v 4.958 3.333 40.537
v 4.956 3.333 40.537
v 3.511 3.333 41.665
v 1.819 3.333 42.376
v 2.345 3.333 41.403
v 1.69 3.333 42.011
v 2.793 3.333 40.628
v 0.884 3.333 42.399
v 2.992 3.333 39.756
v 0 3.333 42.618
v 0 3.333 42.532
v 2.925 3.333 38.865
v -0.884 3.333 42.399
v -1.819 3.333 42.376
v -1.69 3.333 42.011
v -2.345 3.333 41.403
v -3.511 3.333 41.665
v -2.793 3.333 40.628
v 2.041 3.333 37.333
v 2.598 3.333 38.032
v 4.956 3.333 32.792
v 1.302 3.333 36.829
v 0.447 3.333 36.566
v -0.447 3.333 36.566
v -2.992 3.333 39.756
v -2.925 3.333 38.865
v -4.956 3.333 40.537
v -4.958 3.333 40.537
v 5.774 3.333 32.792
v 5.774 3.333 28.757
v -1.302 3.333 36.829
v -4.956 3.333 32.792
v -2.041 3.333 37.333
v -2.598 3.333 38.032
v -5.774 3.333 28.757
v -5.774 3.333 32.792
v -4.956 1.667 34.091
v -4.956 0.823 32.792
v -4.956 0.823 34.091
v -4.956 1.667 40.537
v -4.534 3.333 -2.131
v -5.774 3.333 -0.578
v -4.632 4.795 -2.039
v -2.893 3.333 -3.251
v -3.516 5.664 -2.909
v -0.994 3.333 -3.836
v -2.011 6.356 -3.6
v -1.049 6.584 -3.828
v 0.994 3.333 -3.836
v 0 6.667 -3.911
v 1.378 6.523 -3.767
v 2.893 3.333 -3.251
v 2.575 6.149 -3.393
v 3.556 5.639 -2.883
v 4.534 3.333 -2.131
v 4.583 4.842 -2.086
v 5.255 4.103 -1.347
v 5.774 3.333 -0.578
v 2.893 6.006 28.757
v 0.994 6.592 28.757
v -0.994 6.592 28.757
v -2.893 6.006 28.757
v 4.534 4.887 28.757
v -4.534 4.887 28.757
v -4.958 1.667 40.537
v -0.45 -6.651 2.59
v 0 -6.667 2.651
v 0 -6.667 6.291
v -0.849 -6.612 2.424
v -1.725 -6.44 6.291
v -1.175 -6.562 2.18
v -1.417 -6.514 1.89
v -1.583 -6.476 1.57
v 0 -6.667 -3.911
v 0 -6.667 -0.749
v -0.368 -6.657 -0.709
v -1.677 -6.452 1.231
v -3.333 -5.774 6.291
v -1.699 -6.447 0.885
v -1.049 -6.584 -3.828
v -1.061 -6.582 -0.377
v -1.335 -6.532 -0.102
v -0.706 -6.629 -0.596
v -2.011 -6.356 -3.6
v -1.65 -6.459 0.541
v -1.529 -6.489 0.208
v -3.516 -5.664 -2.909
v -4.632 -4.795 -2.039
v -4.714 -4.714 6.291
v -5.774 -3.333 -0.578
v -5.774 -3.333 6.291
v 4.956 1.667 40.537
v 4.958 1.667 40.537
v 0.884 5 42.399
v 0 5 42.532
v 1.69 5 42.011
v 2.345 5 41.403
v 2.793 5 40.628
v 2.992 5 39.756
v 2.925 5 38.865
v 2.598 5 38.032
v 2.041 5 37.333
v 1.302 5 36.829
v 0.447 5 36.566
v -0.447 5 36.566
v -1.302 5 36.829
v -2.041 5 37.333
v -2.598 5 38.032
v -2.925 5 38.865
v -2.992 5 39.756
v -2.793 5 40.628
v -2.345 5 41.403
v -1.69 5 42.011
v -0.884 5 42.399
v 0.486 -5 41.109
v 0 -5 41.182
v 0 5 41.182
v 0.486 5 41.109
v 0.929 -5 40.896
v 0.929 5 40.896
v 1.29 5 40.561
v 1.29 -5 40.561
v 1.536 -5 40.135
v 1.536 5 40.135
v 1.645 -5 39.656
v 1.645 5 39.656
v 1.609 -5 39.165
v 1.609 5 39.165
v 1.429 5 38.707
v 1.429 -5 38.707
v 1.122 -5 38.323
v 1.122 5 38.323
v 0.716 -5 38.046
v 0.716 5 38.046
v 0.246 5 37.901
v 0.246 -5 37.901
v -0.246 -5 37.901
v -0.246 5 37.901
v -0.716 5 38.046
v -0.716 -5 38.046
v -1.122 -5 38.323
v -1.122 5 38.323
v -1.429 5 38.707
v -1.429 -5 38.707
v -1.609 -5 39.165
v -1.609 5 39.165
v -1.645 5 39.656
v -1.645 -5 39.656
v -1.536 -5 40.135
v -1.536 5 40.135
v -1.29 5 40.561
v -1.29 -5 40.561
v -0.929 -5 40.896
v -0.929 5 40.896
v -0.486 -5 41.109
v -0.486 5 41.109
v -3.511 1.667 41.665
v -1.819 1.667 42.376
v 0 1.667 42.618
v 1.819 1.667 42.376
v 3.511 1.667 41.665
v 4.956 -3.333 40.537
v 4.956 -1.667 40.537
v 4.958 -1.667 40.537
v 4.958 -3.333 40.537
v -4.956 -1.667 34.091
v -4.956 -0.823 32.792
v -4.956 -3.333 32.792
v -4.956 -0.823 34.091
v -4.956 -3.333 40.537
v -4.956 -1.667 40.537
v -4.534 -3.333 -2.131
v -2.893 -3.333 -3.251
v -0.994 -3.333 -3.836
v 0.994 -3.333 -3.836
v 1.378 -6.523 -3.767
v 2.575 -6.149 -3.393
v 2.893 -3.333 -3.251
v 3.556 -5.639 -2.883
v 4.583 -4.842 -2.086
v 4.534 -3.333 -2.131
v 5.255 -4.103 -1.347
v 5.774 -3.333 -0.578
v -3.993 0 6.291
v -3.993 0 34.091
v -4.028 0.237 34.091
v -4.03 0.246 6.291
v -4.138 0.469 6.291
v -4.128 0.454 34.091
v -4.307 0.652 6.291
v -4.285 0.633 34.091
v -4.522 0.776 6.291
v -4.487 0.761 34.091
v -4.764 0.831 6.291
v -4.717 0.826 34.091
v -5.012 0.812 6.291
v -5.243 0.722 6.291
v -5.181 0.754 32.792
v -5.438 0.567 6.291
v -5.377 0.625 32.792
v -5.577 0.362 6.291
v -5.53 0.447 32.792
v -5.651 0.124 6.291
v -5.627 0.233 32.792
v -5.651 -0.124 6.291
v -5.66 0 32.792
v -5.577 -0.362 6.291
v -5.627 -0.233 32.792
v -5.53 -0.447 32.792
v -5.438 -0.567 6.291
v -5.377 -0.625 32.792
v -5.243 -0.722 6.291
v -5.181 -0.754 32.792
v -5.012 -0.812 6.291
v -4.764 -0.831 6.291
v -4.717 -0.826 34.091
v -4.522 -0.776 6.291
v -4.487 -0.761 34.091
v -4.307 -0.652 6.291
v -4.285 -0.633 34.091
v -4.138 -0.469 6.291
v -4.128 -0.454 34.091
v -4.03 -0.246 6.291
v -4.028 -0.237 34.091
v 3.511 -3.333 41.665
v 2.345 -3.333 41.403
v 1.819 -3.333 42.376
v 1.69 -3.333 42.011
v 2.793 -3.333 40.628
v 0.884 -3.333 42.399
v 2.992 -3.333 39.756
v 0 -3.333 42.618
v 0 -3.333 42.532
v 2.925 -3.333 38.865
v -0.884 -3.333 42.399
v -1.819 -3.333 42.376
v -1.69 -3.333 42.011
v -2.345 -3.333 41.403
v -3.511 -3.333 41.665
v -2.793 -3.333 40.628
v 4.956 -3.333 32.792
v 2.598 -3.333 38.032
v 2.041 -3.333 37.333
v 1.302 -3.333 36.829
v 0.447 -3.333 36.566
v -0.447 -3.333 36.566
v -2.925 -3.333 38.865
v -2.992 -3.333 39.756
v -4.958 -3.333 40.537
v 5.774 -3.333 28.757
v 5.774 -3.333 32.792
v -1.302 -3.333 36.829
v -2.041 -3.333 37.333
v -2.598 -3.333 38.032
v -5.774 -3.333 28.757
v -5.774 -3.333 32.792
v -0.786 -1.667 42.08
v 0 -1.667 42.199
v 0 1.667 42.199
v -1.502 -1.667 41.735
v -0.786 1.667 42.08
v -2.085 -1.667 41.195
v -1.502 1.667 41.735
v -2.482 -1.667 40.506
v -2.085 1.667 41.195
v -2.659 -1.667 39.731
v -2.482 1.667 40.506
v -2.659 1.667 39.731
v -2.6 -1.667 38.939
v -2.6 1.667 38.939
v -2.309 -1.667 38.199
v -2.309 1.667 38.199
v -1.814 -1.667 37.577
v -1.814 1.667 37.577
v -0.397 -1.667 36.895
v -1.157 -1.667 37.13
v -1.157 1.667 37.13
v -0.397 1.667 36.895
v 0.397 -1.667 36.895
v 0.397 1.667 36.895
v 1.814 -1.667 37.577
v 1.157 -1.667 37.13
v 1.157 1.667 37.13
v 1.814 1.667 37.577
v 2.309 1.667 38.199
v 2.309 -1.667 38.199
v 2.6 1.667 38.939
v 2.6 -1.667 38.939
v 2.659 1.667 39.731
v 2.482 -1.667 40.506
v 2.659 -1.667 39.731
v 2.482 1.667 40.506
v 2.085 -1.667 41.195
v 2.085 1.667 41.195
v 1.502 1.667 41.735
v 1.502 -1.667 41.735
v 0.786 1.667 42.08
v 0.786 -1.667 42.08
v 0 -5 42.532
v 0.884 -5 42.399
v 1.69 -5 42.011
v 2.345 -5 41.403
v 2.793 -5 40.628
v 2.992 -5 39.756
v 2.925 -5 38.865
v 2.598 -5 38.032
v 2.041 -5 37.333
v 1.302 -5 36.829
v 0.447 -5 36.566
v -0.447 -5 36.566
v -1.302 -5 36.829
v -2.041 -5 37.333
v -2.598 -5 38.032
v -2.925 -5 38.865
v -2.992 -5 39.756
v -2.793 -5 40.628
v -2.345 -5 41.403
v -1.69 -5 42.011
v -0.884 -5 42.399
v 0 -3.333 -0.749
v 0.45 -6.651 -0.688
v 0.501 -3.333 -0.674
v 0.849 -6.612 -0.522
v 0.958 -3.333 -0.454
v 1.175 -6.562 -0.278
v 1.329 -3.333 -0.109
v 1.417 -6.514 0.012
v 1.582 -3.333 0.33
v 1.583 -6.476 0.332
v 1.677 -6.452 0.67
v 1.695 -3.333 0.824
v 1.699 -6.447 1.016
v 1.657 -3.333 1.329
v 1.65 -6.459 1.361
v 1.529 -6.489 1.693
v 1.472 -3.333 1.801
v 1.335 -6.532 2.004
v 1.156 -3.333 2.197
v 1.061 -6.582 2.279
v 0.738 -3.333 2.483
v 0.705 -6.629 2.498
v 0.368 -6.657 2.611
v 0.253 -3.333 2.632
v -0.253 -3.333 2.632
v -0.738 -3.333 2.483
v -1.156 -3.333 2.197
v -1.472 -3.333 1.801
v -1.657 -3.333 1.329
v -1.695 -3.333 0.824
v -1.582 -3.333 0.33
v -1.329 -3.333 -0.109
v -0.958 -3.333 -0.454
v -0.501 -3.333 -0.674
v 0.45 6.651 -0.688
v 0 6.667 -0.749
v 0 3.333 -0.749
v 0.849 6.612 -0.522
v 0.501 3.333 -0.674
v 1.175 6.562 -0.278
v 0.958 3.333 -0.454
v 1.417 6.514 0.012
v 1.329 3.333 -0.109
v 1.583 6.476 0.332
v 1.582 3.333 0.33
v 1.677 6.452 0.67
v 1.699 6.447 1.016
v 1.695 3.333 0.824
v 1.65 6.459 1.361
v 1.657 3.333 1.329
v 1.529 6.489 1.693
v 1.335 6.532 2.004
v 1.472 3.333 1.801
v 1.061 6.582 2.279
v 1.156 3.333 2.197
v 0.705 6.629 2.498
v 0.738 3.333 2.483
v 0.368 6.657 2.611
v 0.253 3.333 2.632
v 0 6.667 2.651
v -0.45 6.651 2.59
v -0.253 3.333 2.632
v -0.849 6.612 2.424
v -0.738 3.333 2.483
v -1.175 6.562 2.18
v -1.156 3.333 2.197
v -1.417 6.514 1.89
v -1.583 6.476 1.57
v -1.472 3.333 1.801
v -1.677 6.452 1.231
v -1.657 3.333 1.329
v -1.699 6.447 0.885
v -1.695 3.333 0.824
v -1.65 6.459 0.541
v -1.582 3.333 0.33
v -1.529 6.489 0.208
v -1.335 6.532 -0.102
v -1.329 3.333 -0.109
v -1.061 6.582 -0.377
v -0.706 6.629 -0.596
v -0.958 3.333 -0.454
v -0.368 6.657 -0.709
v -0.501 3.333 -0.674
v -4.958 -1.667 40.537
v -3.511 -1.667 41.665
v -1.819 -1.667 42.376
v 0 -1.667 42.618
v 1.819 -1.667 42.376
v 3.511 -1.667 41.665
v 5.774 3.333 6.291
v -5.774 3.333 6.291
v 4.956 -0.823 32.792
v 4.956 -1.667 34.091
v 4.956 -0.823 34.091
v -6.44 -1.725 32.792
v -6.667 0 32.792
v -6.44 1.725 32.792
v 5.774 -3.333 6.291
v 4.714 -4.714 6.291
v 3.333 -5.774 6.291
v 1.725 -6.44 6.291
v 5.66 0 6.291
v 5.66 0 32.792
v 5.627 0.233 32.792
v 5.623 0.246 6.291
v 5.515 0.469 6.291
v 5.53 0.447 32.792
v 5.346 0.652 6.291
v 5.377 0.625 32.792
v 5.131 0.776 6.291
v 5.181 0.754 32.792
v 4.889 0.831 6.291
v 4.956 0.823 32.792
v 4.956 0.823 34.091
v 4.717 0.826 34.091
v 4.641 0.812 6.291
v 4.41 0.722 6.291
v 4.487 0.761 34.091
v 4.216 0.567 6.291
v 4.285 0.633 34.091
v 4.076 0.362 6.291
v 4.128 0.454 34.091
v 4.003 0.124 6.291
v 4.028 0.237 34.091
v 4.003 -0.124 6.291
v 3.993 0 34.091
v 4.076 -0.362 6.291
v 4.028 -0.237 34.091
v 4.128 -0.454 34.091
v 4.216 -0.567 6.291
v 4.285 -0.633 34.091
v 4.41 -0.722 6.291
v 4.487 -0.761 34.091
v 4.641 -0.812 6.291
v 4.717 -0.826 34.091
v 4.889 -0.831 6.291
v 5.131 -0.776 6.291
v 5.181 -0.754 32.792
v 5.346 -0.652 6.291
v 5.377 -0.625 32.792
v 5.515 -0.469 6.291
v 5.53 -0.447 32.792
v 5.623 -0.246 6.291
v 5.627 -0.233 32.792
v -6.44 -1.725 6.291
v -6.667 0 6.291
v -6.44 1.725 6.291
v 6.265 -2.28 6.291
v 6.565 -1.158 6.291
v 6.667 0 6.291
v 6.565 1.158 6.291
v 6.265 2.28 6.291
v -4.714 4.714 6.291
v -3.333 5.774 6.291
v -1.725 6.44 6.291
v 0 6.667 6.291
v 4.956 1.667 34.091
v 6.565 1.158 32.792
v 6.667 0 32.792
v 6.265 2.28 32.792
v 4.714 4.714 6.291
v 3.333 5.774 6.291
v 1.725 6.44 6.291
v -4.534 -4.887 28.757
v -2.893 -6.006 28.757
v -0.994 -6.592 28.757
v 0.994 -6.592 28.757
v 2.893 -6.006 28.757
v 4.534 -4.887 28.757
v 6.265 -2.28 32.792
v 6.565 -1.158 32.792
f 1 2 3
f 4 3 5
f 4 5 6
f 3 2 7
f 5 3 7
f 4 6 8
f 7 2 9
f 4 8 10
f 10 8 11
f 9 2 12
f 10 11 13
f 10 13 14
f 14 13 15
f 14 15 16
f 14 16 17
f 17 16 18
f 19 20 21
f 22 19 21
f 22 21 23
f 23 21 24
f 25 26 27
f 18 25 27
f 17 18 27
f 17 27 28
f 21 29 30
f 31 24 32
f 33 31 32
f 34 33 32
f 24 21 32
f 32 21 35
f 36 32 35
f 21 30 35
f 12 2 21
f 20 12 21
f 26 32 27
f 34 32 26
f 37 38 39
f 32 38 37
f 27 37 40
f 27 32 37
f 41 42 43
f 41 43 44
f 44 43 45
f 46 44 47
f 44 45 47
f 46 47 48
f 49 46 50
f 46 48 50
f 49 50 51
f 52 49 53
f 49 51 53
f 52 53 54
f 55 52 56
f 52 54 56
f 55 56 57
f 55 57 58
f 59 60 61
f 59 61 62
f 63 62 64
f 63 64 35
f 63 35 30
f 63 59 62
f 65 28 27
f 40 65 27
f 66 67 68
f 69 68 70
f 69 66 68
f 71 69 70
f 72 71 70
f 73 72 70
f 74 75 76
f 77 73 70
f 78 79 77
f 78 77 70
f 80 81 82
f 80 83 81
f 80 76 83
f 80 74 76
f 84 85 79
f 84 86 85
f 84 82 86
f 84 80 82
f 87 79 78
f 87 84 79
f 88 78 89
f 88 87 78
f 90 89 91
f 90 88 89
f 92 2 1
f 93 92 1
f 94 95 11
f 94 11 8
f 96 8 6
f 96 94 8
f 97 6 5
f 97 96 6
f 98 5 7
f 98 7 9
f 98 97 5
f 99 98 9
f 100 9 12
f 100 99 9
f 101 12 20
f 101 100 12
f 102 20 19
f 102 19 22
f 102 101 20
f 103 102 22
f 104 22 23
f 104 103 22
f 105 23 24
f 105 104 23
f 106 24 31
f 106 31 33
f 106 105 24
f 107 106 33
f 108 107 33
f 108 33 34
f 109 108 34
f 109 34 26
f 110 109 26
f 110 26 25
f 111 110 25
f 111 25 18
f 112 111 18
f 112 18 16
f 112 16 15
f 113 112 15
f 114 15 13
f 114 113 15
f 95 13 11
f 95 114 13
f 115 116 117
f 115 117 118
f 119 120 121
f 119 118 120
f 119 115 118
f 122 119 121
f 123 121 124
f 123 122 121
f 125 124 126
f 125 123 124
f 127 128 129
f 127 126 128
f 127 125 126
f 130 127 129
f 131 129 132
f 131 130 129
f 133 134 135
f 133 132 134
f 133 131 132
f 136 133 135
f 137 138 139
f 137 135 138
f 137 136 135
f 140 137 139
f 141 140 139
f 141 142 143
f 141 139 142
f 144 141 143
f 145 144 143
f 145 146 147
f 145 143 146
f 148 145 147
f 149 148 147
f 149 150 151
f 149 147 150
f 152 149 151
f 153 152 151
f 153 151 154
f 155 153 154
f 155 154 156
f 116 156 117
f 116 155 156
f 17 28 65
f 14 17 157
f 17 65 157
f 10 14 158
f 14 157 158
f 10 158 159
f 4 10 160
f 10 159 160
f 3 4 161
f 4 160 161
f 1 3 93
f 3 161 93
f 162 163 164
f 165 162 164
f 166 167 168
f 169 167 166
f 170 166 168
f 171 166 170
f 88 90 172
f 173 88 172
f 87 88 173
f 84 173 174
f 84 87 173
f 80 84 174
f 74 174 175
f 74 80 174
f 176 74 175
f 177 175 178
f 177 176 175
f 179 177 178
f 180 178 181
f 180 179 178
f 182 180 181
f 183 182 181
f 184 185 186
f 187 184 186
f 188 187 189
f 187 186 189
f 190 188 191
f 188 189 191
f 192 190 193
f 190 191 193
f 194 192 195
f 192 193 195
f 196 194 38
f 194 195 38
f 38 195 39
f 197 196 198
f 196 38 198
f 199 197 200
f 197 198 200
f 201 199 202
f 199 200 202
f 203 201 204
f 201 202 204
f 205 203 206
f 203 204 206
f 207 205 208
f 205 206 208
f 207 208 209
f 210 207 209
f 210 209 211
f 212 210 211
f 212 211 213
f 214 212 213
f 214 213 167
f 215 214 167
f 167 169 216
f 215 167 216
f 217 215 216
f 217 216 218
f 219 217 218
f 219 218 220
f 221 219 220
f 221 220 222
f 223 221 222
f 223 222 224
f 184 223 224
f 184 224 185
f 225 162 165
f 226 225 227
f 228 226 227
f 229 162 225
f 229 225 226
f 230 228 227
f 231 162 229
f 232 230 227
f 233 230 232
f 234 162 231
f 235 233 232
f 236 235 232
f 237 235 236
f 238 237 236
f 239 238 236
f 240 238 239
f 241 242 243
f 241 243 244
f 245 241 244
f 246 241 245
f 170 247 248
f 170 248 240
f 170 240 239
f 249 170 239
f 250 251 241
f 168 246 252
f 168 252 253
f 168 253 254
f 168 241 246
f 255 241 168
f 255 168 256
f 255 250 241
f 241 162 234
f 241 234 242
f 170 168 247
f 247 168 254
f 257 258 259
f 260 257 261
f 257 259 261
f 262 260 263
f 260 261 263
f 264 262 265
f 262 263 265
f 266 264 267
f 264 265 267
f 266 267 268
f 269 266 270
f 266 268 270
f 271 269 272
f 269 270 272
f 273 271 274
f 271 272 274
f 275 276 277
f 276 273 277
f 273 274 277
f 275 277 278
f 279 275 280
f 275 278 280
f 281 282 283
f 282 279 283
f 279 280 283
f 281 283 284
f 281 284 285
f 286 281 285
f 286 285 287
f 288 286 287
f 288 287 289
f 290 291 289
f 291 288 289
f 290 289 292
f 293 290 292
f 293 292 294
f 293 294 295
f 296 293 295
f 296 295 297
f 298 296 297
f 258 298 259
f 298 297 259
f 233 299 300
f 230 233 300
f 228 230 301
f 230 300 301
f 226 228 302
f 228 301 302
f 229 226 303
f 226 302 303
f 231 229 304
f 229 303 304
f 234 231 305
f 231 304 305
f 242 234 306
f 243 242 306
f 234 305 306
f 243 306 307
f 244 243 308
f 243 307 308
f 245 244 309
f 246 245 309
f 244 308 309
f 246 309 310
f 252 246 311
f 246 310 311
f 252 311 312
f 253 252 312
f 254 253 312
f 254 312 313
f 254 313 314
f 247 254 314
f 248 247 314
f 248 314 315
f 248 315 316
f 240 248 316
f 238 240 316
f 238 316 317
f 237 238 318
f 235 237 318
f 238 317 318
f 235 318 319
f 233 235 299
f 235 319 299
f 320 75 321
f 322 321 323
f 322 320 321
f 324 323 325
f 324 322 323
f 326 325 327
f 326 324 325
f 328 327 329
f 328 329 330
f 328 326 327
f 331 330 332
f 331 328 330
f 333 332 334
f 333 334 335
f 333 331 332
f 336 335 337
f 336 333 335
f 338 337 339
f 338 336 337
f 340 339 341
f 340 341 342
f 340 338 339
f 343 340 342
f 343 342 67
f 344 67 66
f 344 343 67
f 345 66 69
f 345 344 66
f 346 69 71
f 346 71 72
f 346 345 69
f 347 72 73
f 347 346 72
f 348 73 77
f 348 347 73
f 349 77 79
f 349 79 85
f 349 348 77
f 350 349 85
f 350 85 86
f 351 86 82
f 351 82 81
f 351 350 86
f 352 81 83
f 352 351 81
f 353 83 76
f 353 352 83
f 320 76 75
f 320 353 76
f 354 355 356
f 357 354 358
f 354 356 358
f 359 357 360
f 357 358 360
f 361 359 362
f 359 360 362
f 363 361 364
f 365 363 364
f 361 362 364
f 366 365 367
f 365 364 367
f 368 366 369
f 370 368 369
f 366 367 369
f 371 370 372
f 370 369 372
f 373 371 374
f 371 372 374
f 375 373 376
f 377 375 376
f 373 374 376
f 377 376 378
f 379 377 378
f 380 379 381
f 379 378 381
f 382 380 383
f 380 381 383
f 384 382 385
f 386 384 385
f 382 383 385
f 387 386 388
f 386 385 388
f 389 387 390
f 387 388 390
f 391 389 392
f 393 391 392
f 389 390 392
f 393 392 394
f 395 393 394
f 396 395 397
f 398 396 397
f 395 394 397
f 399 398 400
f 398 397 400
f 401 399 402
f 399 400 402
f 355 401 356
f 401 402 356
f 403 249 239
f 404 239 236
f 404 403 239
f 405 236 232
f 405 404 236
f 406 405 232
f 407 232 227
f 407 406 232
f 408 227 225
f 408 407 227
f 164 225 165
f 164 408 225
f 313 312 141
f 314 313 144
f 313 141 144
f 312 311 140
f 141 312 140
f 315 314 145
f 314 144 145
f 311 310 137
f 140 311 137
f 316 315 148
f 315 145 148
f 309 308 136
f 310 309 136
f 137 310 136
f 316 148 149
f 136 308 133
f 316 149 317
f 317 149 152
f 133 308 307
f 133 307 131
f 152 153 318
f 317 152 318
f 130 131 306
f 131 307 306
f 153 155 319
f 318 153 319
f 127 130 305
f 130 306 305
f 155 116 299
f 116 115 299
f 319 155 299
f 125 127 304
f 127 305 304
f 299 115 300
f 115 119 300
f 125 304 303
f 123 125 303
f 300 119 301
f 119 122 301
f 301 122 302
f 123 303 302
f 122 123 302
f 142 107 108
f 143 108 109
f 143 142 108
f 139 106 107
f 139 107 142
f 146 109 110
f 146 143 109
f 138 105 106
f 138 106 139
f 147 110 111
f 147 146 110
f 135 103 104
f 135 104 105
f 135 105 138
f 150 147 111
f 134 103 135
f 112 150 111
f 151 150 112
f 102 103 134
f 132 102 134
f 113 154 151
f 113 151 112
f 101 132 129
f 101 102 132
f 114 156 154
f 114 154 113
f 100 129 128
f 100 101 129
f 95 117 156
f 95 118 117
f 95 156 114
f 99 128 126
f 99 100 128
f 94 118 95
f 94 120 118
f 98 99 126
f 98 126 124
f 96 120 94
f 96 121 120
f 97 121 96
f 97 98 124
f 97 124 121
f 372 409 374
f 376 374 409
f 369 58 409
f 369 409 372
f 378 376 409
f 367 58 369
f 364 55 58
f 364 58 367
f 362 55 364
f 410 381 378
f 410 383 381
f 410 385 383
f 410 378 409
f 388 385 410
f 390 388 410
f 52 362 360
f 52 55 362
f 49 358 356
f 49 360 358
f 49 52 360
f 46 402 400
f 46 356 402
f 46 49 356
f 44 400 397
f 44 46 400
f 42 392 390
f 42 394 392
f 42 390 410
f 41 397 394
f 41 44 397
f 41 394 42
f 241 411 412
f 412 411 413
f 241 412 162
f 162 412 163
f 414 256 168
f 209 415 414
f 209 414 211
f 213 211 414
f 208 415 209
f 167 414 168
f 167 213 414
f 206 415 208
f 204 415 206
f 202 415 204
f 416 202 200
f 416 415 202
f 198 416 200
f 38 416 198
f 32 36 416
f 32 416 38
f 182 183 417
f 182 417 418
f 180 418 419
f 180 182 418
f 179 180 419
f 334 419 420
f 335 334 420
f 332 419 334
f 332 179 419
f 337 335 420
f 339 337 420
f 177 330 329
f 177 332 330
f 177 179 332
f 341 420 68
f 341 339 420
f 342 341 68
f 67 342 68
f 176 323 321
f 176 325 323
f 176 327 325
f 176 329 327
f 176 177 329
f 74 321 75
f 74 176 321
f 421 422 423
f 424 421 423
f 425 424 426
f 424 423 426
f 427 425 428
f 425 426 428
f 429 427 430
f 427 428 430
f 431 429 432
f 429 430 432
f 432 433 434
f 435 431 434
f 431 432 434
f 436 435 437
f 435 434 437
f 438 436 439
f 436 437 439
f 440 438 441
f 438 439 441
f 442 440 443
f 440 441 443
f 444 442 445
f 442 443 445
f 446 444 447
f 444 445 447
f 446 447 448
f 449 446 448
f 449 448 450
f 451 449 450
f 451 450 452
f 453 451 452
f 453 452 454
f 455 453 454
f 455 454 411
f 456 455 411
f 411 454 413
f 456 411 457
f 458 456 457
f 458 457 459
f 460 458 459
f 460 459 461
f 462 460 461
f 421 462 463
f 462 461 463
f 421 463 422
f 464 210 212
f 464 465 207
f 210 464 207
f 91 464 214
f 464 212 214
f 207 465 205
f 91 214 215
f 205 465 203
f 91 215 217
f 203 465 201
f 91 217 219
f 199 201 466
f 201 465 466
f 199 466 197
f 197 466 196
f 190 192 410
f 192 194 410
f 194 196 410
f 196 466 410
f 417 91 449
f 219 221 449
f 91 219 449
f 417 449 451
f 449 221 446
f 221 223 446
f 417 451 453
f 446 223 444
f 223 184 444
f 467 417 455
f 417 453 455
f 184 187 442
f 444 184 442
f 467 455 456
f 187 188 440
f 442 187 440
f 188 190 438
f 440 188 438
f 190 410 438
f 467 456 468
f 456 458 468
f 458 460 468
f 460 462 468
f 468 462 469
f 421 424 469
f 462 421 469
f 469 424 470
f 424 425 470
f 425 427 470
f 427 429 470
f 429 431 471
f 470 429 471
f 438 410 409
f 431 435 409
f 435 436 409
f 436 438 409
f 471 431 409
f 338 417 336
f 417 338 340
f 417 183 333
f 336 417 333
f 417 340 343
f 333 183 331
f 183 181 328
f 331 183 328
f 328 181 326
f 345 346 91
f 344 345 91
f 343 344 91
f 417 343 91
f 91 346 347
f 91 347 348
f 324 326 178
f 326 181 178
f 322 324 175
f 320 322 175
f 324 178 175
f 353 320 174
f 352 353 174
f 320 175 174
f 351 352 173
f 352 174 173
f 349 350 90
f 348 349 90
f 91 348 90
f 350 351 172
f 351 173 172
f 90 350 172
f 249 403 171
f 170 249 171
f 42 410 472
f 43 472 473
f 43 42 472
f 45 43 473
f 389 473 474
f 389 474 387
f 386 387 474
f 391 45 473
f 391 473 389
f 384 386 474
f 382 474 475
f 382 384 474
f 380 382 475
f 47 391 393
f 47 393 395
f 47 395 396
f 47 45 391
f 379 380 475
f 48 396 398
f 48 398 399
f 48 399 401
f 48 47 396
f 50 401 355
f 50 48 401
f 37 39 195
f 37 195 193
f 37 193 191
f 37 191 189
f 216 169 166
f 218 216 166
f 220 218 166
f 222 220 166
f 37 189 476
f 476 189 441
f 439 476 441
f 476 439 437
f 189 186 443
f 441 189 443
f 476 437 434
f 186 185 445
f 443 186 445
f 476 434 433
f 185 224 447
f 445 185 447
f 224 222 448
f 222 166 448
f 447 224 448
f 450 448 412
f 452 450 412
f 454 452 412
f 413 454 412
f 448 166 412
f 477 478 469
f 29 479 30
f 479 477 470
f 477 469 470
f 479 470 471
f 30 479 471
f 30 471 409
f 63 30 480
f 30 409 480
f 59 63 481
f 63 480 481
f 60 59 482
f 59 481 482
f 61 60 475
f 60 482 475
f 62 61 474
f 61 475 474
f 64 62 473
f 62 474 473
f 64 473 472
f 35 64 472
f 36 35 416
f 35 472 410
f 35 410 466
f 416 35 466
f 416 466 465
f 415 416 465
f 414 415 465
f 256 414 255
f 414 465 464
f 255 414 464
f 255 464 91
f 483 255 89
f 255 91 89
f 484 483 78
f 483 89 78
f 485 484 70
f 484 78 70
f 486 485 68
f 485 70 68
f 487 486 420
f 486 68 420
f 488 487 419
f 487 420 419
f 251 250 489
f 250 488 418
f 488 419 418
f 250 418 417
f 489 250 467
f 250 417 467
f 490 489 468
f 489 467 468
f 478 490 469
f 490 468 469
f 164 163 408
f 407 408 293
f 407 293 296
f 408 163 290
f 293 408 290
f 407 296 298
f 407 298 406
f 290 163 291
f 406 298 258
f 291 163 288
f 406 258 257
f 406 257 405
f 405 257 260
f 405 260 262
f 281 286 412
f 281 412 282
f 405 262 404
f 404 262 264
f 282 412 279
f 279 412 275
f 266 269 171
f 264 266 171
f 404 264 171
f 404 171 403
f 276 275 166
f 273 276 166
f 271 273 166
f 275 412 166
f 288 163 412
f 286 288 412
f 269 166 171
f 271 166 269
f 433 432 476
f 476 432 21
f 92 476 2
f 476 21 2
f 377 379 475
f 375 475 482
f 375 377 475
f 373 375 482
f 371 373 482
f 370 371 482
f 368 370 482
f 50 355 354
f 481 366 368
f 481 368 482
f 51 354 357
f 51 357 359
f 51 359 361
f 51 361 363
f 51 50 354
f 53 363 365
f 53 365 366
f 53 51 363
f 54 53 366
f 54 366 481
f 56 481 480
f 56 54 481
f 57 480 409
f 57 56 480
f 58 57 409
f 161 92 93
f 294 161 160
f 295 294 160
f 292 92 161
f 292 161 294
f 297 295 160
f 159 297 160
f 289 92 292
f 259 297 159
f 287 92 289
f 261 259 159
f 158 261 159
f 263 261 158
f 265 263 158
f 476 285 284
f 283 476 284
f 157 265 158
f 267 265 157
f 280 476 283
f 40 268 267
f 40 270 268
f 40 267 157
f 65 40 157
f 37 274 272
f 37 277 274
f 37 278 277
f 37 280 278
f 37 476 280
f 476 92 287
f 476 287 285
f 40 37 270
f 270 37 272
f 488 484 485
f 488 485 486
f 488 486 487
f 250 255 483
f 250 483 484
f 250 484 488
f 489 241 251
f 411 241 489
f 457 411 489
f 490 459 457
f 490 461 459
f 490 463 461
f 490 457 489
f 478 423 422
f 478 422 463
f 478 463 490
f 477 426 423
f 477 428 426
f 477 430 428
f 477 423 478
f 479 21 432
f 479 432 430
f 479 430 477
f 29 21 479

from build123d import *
from build123d.topology import SkipClean

# Parameters (mm, degrees)
SKETCH2_R                       = 10
PHALANGE_LENGTH_DEPTH           = 41.7
BOSS_EXTRUDE3_DEPTH             = 5
BOSS_EXTRUDE4_DEPTH             = 5
BOSS_EXTRUDE4_DEPTH_BACK        = 5
CUT_EXTRUDE2_START              = -15.3025
CUT_EXTRUDE2_DEPTH              = 15.3025
SKETCH7_R                       = 1.65
CUT_EXTRUDE3_DEPTH              = 10
CUT_EXTRUDE4_DEPTH              = 2.5
CUT_EXTRUDE4_DEPTH_BACK         = 2.5
CUT_EXTRUDE7_REACH              = 61.833
SKETCH4_R                       = 1.65
CUT_EXTRUDE7_DIRECTION_2_REACH  = 61.833
CUT_EXTRUDE_THIN1_START         = 41.7
CUT_EXTRUDE_THIN1_DEPTH         = 10.361670454
BOSS_EXTRUDE5_REACH             = 61.255
SKETCH9_R                       = 4
SKETCH9_R_2                     = 1.65
CUT_EXTRUDE8_REACH              = 60.731
SKETCH10_R                      = 1.25
CUT_EXTRUDE9_START              = -8
CUT_EXTRUDE9_DEPTH              = 8
CUT_EXTRUDE10_REACH             = 61.255
CUT_EXTRUDE10_DIRECTION_2_REACH = 61.255
CUT_EXTRUDE11_START             = -10
CUT_EXTRUDE11_OUTLINE_W         = 2.565773848
CUT_EXTRUDE11_OUTLINE_H         = 11.6166929
CUT_EXTRUDE11_DEPTH             = 10
BOSS_EXTRUDE6_START             = 7.5
SKETCH14_R                      = 4.5
SKETCH14_R_2                    = 1.65
BOSS_EXTRUDE6_DEPTH             = 2.5
BOSS_EXTRUDE7_START             = -7.5
SKETCH14_2_R                    = 4.5
SKETCH14_2_R_2                  = 1.65
BOSS_EXTRUDE7_DEPTH             = 2.5
SCALE1_SCALE                    = 0.666666667
CUT_EXTRUDE12_START             = -11.666667
SKETCH15_R                      = 1.65
CUT_EXTRUDE12_DEPTH             = 13.333339
CUT_EXTRUDE13_REACH             = 46.28
SKETCH16_R                      = 1.7
CUT_EXTRUDE13_DIRECTION_2_REACH = 46.28


# Read off the part's stored shape, not the designer's step: Cut-Extrude-Thin1, Cut-Extrude11
with BuildPart() as part:
    # Sketch2 → Phalange Length (new body)
    with BuildSketch(Plane.XY):
        Circle(SKETCH2_R)
    extrude(amount=PHALANGE_LENGTH_DEPTH)

    # Sketch3 → Boss-Extrude3 (add)
    with BuildSketch(Plane(origin=(0, -10, 0), x_dir=(-1, 0, 0), z_dir=(0, -1, 0))):
        with BuildLine():
            Line((-10, 5.302499701), (-10, 0))
            Line((-10, 0), (10, 0))
            Line((10, 0), (10, 5.302499701))
            ThreePointArc((10, 5.302499701), (0, 15.302499701), (-10, 5.302499701))
        make_face()
    boss_extrude3 = extrude(amount=-BOSS_EXTRUDE3_DEPTH)

    # Mirror1: Boss-Extrude3 across plane
    add(boss_extrude3.mirror(Plane.ZX))

    # Sketch5 → Boss-Extrude4 (add, two sides: drawn at the far end of the back side and taken through both)
    with BuildSketch(Plane(origin=(0, 0, 0), x_dir=(1, 0, 0), z_dir=(0, 1, 0)).offset(-BOSS_EXTRUDE4_DEPTH_BACK)):
        with BuildLine():
            Line((-10, -47.483157911), (-10, -41.7))
            Line((-10, -41.7), (10, -41.7))
            Line((10, -41.7), (10, -47.483157911))
            ThreePointArc((10, -47.483157911), (0, -57.051984156), (-10, -47.483157911))
        make_face()
    extrude(amount=BOSS_EXTRUDE4_DEPTH + BOSS_EXTRUDE4_DEPTH_BACK)

    # Sketch6 → Cut-Extrude2 (cut)
    with SkipClean():  # the faces are left unmerged after this step: merging them gives an invalid solid
        with BuildSketch(Plane.XY.offset(CUT_EXTRUDE2_START)):
            with BuildLine():
                ThreePointArc((0, 10), (5, 8.660254038), (8.660254038, 5))
                Line((8.660254038, 5), (10, 5))
                Line((10, 5), (10, 10))
                Line((10, 10), (0, 10))
            make_face()
            with BuildLine():
                Line((10, -5), (8.660254038, -5))
                ThreePointArc((8.660254038, -5), (5, -8.660254038), (0, -10))
                Line((0, -10), (10, -10))
                Line((10, -10), (10, -5))
            make_face()
            with BuildLine():
                ThreePointArc((-8.660254038, 5), (-5, 8.660254038), (0, 10))
                Line((0, 10), (-10, 10))
                Line((-10, 10), (-10, 5))
                Line((-10, 5), (-8.660254038, 5))
            make_face()
            with BuildLine():
                Line((-10, -10), (0, -10))
                ThreePointArc((0, -10), (-5, -8.660254038), (-8.660254038, -5))
                Line((-8.660254038, -5), (-10, -5))
                Line((-10, -5), (-10, -10))
            make_face()
        extrude(amount=CUT_EXTRUDE2_DEPTH, mode=Mode.SUBTRACT)

    # Sketch7 → Cut-Extrude3 (cut)
    with SkipClean():  # the faces are left unmerged after this step: merging them gives an invalid solid
        with BuildSketch(Plane(origin=(0, 5, 0), x_dir=(1, 0, 0), z_dir=(0, 1, 0))):
            with Locations(Location((0, -49.861984156, 0), (0, 0, 270))):
                Circle(SKETCH7_R)
        extrude(amount=-CUT_EXTRUDE3_DEPTH, mode=Mode.SUBTRACT)

    # Sketch5<2> → Cut-Extrude4 (cut, two sides: drawn at the far end of the back side and taken through both)
    with BuildSketch(Plane(origin=(0, 0, 0), x_dir=(1, 0, 0), z_dir=(0, 1, 0)).offset(-CUT_EXTRUDE4_DEPTH_BACK)):
        with BuildLine():
            Line((-10, -47.483157911), (-10, -41.7))
            Line((-10, -41.7), (10, -41.7))
            Line((10, -41.7), (10, -47.483157911))
            ThreePointArc((10, -47.483157911), (0, -57.051984156), (-10, -47.483157911))
        make_face()
    extrude(amount=CUT_EXTRUDE4_DEPTH + CUT_EXTRUDE4_DEPTH_BACK, mode=Mode.SUBTRACT)

    # Sketch4 → Cut-Extrude7 (cut, up to next)
    with BuildSketch(Plane(origin=(0, -5, 0), x_dir=(1, 0, 0), z_dir=(0, 1, 0)), mode=Mode.PRIVATE) as cut_extrude7_sk1:
        with Locations(Location((0, 8.010159673, 0), (0, 0, 270))):
            Circle(SKETCH4_R)
    cut_extrude7_tool1 = extrude(cut_extrude7_sk1.sketch, amount=-CUT_EXTRUDE7_REACH, mode=Mode.PRIVATE) & part.part
    add(cut_extrude7_tool1.solids().sort_by_distance((0, -5, -8.01016))[0], mode=Mode.SUBTRACT)

    # Sketch4 → Cut-Extrude7 direction 2 (cut, up to next)
    with BuildSketch(Plane(origin=(0, -5, 0), x_dir=(1, 0, 0), z_dir=(0, 1, 0)), mode=Mode.PRIVATE) as cut_extrude7_direction_2_sk1:
        with Locations(Location((0, 8.010159673, 0), (0, 0, 270))):
            Circle(SKETCH4_R)
    cut_extrude7_direction_2_tool1 = extrude(cut_extrude7_direction_2_sk1.sketch, amount=CUT_EXTRUDE7_DIRECTION_2_REACH, mode=Mode.PRIVATE) & part.part
    add(cut_extrude7_direction_2_tool1.solids().sort_by_distance((0, -5, -8.01016))[0], mode=Mode.SUBTRACT)

    # Cut-Extrude-Thin1 outline → Cut-Extrude-Thin1 (cut)
    with SkipClean():  # the faces are left unmerged after this step: merging them gives an invalid solid
        with BuildSketch(Plane.XY.offset(CUT_EXTRUDE_THIN1_START)):
            with BuildLine():
                ThreePointArc((8.660254038, 5), (9.256147934, 3.78466979), (9.682458366, 2.5))
                Line((9.682458366, 2.5), (10, 2.5))
                Line((10, 2.5), (10, 5))
                Line((10, 5), (8.660254038, 5))
            make_face()
            with BuildLine():
                Line((10, -2.5), (9.682458366, -2.5))
                ThreePointArc((9.682458366, -2.5), (9.256147934, -3.78466979), (8.660254038, -5))
                Line((8.660254038, -5), (10, -5))
                Line((10, -5), (10, -2.5))
            make_face()
            with BuildLine():
                Line((-10, 2.5), (-9.682458366, 2.5))
                ThreePointArc((-9.682458366, 2.5), (-9.256147934, 3.78466979), (-8.660254038, 5))
                Line((-8.660254038, 5), (-10, 5))
                Line((-10, 5), (-10, 2.5))
            make_face()
            with BuildLine():
                ThreePointArc((-8.660254038, -5), (-9.256147934, -3.78466979), (-9.682458366, -2.5))
                Line((-9.682458366, -2.5), (-10, -2.5))
                Line((-10, -2.5), (-10, -5))
                Line((-10, -5), (-8.660254038, -5))
            make_face()
        extrude(amount=CUT_EXTRUDE_THIN1_DEPTH, mode=Mode.SUBTRACT)

    # Sketch9 → Boss-Extrude5 (add, up to next)
    with BuildSketch(Plane.XZ.offset(-2.5), mode=Mode.PRIVATE) as boss_extrude5_sk1:
        with Locations(Location((0, 49.861984156, 0), (0, 0, 90))):
            Circle(SKETCH9_R)
        with Locations(Location((0, 49.861984156, 0), (0, 0, 90))):
            Circle(SKETCH9_R_2, mode=Mode.SUBTRACT)
    boss_extrude5_tool1 = extrude(boss_extrude5_sk1.sketch, amount=BOSS_EXTRUDE5_REACH, mode=Mode.PRIVATE) - part.part
    add(boss_extrude5_tool1.solids().sort_by_distance((0, 2.5, 45.975121))[0])

    # Sketch10 → Cut-Extrude8 (cut, up to next)
    with BuildSketch(Plane.XY.offset(41.7), mode=Mode.PRIVATE) as cut_extrude8_sk1:
        with Locations((7.239961745, 0)):
            Circle(SKETCH10_R)
    cut_extrude8_tool1 = extrude(cut_extrude8_sk1.sketch, amount=-CUT_EXTRUDE8_REACH, mode=Mode.PRIVATE) & part.part
    # Sketch10 → Cut-Extrude8 (cut, up to next)
    with BuildSketch(Plane.XY.offset(41.7), mode=Mode.PRIVATE) as cut_extrude8_sk2:
        with Locations((-7.239961745, 0)):
            Circle(SKETCH10_R)
    cut_extrude8_tool2 = extrude(cut_extrude8_sk2.sketch, amount=-CUT_EXTRUDE8_REACH, mode=Mode.PRIVATE) & part.part
    add(cut_extrude8_tool1.solids().sort_by_distance((7.239962, 0, 41.7))[0], mode=Mode.SUBTRACT)
    add(cut_extrude8_tool2.solids().sort_by_distance((-7.239962, 0, 41.7))[0], mode=Mode.SUBTRACT)

    # Sketch11 → Cut-Extrude9 (cut)
    with SkipClean():  # the faces are left unmerged after this step: merging them gives an invalid solid
        with BuildSketch(Plane.XY.offset(41.7).offset(CUT_EXTRUDE9_START)):
            with BuildLine():
                ThreePointArc((8.660254038, 5), (0, 10), (-8.660254038, 5))
                Line((-8.660254038, 5), (8.660254038, 5))
            make_face()
            with BuildLine():
                Line((8.660254038, -5), (-8.660254038, -5))
                ThreePointArc((-8.660254038, -5), (0, -10), (8.660254038, -5))
            make_face()
        extrude(amount=CUT_EXTRUDE9_DEPTH, mode=Mode.SUBTRACT)

    # Sketch12 → Cut-Extrude10 (cut, up to next)
    with BuildSketch(Plane.XZ.offset(-2.5), mode=Mode.PRIVATE) as cut_extrude10_sk1:
        with BuildLine():
            Line((-10.033719202, 57.051984156), (-10.033719202, 49.864892021))
            Line((-10.033719202, 49.864892021), (-8.660254038, 49.864892021))
            ThreePointArc((-8.660254038, 49.864892021), (0, 54.490740593), (8.660254038, 49.864892021))
            Line((8.660254038, 49.864892021), (10.033719202, 49.864892021))
            Line((10.033719202, 49.864892021), (10.033719202, 57.051984156))
            Line((10.033719202, 57.051984156), (-10.033719202, 57.051984156))
        make_face()
    cut_extrude10_tool1 = extrude(cut_extrude10_sk1.sketch, amount=CUT_EXTRUDE10_REACH, mode=Mode.PRIVATE) & part.part
    add(cut_extrude10_tool1.solids().sort_by_distance((0, 2.5, 54.550279))[0], mode=Mode.SUBTRACT)

    # Sketch12 → Cut-Extrude10 direction 2 (cut, up to next)
    with BuildSketch(Plane.XZ.offset(-2.5), mode=Mode.PRIVATE) as cut_extrude10_direction_2_sk1:
        with BuildLine():
            Line((-10.033719202, 57.051984156), (-10.033719202, 49.864892021))
            Line((-10.033719202, 49.864892021), (-8.660254038, 49.864892021))
            ThreePointArc((-8.660254038, 49.864892021), (0, 54.490740593), (8.660254038, 49.864892021))
            Line((8.660254038, 49.864892021), (10.033719202, 49.864892021))
            Line((10.033719202, 49.864892021), (10.033719202, 57.051984156))
            Line((10.033719202, 57.051984156), (-10.033719202, 57.051984156))
        make_face()
    cut_extrude10_direction_2_tool1 = extrude(cut_extrude10_direction_2_sk1.sketch, amount=-CUT_EXTRUDE10_DIRECTION_2_REACH, mode=Mode.PRIVATE) & part.part
    add(cut_extrude10_direction_2_tool1.solids().sort_by_distance((0, 2.5, 54.550279))[0], mode=Mode.SUBTRACT)

    # Cut-Extrude11 outline → Cut-Extrude11 (cut)
    with BuildSketch(Plane.XZ.offset(5).offset(CUT_EXTRUDE11_START)):
        with Locations((-8.717113076, 45.560571369)):
            Rectangle(CUT_EXTRUDE11_OUTLINE_W, CUT_EXTRUDE11_OUTLINE_H)
        with Locations((8.717113076, 45.560571369)):
            Rectangle(CUT_EXTRUDE11_OUTLINE_W, CUT_EXTRUDE11_OUTLINE_H)
    extrude(amount=CUT_EXTRUDE11_DEPTH, mode=Mode.SUBTRACT)

    # Sketch14 → Boss-Extrude6 (add)
    with SkipClean():  # the faces are left unmerged after this step: merging them gives an invalid solid
        with BuildSketch(Plane(origin=(0, 0, 0), x_dir=(1, 0, 0), z_dir=(0, 1, 0)).offset(BOSS_EXTRUDE6_START)):
            with Locations(Location((0, -49.861984156, 0), (0, 0, 270))):
                Circle(SKETCH14_R)
            with Locations(Location((0, -49.861984156, 0), (0, 0, 270))):
                Circle(SKETCH14_R_2, mode=Mode.SUBTRACT)
        extrude(amount=-BOSS_EXTRUDE6_DEPTH)

    # Sketch14<2> → Boss-Extrude7 (add)
    with SkipClean():  # the faces are left unmerged after this step: merging them gives an invalid solid
        with BuildSketch(Plane(origin=(0, 0, 0), x_dir=(1, 0, 0), z_dir=(0, 1, 0)).offset(BOSS_EXTRUDE7_START)):
            with Locations(Location((0, -49.861984156, 0), (0, 0, 270))):
                Circle(SKETCH14_2_R)
            with Locations(Location((0, -49.861984156, 0), (0, 0, 270))):
                Circle(SKETCH14_2_R_2, mode=Mode.SUBTRACT)
        extrude(amount=BOSS_EXTRUDE7_DEPTH)


with BuildPart() as part_1:
    # Scale1: scaled about (1e-09, 5e-08, 18.872441715)
    add(part.part.scale(SCALE1_SCALE).moved(Location((0, 1.7e-08, 6.290813905))))

    # Sketch15 → Cut-Extrude12 (cut)
    with BuildSketch(Plane(origin=(0, 4.999994989, 0), x_dir=(1, 0, 0), z_dir=(0, 1, 0)).offset(CUT_EXTRUDE12_START)):
        with Locations(Location((-4.1e-08, -39.532303396, 0), (0, 0, 270))):
            Circle(SKETCH15_R)
    extrude(amount=CUT_EXTRUDE12_DEPTH, mode=Mode.SUBTRACT)

    # Sketch16 → Cut-Extrude13 (cut, up to next)
    with BuildSketch(Plane.XZ.offset(-3.333328323), mode=Mode.PRIVATE) as cut_extrude13_sk1:
        with Locations(Location((-4.1e-08, 0.950874177, 0), (0, 0, 270))):
            Circle(SKETCH16_R)
    cut_extrude13_tool1 = extrude(cut_extrude13_sk1.sketch, amount=-CUT_EXTRUDE13_REACH, mode=Mode.PRIVATE) & part_1.part
    add(cut_extrude13_tool1.solids().sort_by_distance((0, 3.333328, 0.950874))[0], mode=Mode.SUBTRACT)

    # Sketch16 → Cut-Extrude13 direction 2 (cut, up to next)
    with BuildSketch(Plane.XZ.offset(-3.333328323), mode=Mode.PRIVATE) as cut_extrude13_direction_2_sk1:
        with Locations(Location((-4.1e-08, 0.950874177, 0), (0, 0, 270))):
            Circle(SKETCH16_R)
    cut_extrude13_direction_2_tool1 = extrude(cut_extrude13_direction_2_sk1.sketch, amount=CUT_EXTRUDE13_DIRECTION_2_REACH, mode=Mode.PRIVATE) & part_1.part
    add(cut_extrude13_direction_2_tool1.solids().sort_by_distance((0, 3.333328, 0.950874))[0], mode=Mode.SUBTRACT)


solid = part_1.part
